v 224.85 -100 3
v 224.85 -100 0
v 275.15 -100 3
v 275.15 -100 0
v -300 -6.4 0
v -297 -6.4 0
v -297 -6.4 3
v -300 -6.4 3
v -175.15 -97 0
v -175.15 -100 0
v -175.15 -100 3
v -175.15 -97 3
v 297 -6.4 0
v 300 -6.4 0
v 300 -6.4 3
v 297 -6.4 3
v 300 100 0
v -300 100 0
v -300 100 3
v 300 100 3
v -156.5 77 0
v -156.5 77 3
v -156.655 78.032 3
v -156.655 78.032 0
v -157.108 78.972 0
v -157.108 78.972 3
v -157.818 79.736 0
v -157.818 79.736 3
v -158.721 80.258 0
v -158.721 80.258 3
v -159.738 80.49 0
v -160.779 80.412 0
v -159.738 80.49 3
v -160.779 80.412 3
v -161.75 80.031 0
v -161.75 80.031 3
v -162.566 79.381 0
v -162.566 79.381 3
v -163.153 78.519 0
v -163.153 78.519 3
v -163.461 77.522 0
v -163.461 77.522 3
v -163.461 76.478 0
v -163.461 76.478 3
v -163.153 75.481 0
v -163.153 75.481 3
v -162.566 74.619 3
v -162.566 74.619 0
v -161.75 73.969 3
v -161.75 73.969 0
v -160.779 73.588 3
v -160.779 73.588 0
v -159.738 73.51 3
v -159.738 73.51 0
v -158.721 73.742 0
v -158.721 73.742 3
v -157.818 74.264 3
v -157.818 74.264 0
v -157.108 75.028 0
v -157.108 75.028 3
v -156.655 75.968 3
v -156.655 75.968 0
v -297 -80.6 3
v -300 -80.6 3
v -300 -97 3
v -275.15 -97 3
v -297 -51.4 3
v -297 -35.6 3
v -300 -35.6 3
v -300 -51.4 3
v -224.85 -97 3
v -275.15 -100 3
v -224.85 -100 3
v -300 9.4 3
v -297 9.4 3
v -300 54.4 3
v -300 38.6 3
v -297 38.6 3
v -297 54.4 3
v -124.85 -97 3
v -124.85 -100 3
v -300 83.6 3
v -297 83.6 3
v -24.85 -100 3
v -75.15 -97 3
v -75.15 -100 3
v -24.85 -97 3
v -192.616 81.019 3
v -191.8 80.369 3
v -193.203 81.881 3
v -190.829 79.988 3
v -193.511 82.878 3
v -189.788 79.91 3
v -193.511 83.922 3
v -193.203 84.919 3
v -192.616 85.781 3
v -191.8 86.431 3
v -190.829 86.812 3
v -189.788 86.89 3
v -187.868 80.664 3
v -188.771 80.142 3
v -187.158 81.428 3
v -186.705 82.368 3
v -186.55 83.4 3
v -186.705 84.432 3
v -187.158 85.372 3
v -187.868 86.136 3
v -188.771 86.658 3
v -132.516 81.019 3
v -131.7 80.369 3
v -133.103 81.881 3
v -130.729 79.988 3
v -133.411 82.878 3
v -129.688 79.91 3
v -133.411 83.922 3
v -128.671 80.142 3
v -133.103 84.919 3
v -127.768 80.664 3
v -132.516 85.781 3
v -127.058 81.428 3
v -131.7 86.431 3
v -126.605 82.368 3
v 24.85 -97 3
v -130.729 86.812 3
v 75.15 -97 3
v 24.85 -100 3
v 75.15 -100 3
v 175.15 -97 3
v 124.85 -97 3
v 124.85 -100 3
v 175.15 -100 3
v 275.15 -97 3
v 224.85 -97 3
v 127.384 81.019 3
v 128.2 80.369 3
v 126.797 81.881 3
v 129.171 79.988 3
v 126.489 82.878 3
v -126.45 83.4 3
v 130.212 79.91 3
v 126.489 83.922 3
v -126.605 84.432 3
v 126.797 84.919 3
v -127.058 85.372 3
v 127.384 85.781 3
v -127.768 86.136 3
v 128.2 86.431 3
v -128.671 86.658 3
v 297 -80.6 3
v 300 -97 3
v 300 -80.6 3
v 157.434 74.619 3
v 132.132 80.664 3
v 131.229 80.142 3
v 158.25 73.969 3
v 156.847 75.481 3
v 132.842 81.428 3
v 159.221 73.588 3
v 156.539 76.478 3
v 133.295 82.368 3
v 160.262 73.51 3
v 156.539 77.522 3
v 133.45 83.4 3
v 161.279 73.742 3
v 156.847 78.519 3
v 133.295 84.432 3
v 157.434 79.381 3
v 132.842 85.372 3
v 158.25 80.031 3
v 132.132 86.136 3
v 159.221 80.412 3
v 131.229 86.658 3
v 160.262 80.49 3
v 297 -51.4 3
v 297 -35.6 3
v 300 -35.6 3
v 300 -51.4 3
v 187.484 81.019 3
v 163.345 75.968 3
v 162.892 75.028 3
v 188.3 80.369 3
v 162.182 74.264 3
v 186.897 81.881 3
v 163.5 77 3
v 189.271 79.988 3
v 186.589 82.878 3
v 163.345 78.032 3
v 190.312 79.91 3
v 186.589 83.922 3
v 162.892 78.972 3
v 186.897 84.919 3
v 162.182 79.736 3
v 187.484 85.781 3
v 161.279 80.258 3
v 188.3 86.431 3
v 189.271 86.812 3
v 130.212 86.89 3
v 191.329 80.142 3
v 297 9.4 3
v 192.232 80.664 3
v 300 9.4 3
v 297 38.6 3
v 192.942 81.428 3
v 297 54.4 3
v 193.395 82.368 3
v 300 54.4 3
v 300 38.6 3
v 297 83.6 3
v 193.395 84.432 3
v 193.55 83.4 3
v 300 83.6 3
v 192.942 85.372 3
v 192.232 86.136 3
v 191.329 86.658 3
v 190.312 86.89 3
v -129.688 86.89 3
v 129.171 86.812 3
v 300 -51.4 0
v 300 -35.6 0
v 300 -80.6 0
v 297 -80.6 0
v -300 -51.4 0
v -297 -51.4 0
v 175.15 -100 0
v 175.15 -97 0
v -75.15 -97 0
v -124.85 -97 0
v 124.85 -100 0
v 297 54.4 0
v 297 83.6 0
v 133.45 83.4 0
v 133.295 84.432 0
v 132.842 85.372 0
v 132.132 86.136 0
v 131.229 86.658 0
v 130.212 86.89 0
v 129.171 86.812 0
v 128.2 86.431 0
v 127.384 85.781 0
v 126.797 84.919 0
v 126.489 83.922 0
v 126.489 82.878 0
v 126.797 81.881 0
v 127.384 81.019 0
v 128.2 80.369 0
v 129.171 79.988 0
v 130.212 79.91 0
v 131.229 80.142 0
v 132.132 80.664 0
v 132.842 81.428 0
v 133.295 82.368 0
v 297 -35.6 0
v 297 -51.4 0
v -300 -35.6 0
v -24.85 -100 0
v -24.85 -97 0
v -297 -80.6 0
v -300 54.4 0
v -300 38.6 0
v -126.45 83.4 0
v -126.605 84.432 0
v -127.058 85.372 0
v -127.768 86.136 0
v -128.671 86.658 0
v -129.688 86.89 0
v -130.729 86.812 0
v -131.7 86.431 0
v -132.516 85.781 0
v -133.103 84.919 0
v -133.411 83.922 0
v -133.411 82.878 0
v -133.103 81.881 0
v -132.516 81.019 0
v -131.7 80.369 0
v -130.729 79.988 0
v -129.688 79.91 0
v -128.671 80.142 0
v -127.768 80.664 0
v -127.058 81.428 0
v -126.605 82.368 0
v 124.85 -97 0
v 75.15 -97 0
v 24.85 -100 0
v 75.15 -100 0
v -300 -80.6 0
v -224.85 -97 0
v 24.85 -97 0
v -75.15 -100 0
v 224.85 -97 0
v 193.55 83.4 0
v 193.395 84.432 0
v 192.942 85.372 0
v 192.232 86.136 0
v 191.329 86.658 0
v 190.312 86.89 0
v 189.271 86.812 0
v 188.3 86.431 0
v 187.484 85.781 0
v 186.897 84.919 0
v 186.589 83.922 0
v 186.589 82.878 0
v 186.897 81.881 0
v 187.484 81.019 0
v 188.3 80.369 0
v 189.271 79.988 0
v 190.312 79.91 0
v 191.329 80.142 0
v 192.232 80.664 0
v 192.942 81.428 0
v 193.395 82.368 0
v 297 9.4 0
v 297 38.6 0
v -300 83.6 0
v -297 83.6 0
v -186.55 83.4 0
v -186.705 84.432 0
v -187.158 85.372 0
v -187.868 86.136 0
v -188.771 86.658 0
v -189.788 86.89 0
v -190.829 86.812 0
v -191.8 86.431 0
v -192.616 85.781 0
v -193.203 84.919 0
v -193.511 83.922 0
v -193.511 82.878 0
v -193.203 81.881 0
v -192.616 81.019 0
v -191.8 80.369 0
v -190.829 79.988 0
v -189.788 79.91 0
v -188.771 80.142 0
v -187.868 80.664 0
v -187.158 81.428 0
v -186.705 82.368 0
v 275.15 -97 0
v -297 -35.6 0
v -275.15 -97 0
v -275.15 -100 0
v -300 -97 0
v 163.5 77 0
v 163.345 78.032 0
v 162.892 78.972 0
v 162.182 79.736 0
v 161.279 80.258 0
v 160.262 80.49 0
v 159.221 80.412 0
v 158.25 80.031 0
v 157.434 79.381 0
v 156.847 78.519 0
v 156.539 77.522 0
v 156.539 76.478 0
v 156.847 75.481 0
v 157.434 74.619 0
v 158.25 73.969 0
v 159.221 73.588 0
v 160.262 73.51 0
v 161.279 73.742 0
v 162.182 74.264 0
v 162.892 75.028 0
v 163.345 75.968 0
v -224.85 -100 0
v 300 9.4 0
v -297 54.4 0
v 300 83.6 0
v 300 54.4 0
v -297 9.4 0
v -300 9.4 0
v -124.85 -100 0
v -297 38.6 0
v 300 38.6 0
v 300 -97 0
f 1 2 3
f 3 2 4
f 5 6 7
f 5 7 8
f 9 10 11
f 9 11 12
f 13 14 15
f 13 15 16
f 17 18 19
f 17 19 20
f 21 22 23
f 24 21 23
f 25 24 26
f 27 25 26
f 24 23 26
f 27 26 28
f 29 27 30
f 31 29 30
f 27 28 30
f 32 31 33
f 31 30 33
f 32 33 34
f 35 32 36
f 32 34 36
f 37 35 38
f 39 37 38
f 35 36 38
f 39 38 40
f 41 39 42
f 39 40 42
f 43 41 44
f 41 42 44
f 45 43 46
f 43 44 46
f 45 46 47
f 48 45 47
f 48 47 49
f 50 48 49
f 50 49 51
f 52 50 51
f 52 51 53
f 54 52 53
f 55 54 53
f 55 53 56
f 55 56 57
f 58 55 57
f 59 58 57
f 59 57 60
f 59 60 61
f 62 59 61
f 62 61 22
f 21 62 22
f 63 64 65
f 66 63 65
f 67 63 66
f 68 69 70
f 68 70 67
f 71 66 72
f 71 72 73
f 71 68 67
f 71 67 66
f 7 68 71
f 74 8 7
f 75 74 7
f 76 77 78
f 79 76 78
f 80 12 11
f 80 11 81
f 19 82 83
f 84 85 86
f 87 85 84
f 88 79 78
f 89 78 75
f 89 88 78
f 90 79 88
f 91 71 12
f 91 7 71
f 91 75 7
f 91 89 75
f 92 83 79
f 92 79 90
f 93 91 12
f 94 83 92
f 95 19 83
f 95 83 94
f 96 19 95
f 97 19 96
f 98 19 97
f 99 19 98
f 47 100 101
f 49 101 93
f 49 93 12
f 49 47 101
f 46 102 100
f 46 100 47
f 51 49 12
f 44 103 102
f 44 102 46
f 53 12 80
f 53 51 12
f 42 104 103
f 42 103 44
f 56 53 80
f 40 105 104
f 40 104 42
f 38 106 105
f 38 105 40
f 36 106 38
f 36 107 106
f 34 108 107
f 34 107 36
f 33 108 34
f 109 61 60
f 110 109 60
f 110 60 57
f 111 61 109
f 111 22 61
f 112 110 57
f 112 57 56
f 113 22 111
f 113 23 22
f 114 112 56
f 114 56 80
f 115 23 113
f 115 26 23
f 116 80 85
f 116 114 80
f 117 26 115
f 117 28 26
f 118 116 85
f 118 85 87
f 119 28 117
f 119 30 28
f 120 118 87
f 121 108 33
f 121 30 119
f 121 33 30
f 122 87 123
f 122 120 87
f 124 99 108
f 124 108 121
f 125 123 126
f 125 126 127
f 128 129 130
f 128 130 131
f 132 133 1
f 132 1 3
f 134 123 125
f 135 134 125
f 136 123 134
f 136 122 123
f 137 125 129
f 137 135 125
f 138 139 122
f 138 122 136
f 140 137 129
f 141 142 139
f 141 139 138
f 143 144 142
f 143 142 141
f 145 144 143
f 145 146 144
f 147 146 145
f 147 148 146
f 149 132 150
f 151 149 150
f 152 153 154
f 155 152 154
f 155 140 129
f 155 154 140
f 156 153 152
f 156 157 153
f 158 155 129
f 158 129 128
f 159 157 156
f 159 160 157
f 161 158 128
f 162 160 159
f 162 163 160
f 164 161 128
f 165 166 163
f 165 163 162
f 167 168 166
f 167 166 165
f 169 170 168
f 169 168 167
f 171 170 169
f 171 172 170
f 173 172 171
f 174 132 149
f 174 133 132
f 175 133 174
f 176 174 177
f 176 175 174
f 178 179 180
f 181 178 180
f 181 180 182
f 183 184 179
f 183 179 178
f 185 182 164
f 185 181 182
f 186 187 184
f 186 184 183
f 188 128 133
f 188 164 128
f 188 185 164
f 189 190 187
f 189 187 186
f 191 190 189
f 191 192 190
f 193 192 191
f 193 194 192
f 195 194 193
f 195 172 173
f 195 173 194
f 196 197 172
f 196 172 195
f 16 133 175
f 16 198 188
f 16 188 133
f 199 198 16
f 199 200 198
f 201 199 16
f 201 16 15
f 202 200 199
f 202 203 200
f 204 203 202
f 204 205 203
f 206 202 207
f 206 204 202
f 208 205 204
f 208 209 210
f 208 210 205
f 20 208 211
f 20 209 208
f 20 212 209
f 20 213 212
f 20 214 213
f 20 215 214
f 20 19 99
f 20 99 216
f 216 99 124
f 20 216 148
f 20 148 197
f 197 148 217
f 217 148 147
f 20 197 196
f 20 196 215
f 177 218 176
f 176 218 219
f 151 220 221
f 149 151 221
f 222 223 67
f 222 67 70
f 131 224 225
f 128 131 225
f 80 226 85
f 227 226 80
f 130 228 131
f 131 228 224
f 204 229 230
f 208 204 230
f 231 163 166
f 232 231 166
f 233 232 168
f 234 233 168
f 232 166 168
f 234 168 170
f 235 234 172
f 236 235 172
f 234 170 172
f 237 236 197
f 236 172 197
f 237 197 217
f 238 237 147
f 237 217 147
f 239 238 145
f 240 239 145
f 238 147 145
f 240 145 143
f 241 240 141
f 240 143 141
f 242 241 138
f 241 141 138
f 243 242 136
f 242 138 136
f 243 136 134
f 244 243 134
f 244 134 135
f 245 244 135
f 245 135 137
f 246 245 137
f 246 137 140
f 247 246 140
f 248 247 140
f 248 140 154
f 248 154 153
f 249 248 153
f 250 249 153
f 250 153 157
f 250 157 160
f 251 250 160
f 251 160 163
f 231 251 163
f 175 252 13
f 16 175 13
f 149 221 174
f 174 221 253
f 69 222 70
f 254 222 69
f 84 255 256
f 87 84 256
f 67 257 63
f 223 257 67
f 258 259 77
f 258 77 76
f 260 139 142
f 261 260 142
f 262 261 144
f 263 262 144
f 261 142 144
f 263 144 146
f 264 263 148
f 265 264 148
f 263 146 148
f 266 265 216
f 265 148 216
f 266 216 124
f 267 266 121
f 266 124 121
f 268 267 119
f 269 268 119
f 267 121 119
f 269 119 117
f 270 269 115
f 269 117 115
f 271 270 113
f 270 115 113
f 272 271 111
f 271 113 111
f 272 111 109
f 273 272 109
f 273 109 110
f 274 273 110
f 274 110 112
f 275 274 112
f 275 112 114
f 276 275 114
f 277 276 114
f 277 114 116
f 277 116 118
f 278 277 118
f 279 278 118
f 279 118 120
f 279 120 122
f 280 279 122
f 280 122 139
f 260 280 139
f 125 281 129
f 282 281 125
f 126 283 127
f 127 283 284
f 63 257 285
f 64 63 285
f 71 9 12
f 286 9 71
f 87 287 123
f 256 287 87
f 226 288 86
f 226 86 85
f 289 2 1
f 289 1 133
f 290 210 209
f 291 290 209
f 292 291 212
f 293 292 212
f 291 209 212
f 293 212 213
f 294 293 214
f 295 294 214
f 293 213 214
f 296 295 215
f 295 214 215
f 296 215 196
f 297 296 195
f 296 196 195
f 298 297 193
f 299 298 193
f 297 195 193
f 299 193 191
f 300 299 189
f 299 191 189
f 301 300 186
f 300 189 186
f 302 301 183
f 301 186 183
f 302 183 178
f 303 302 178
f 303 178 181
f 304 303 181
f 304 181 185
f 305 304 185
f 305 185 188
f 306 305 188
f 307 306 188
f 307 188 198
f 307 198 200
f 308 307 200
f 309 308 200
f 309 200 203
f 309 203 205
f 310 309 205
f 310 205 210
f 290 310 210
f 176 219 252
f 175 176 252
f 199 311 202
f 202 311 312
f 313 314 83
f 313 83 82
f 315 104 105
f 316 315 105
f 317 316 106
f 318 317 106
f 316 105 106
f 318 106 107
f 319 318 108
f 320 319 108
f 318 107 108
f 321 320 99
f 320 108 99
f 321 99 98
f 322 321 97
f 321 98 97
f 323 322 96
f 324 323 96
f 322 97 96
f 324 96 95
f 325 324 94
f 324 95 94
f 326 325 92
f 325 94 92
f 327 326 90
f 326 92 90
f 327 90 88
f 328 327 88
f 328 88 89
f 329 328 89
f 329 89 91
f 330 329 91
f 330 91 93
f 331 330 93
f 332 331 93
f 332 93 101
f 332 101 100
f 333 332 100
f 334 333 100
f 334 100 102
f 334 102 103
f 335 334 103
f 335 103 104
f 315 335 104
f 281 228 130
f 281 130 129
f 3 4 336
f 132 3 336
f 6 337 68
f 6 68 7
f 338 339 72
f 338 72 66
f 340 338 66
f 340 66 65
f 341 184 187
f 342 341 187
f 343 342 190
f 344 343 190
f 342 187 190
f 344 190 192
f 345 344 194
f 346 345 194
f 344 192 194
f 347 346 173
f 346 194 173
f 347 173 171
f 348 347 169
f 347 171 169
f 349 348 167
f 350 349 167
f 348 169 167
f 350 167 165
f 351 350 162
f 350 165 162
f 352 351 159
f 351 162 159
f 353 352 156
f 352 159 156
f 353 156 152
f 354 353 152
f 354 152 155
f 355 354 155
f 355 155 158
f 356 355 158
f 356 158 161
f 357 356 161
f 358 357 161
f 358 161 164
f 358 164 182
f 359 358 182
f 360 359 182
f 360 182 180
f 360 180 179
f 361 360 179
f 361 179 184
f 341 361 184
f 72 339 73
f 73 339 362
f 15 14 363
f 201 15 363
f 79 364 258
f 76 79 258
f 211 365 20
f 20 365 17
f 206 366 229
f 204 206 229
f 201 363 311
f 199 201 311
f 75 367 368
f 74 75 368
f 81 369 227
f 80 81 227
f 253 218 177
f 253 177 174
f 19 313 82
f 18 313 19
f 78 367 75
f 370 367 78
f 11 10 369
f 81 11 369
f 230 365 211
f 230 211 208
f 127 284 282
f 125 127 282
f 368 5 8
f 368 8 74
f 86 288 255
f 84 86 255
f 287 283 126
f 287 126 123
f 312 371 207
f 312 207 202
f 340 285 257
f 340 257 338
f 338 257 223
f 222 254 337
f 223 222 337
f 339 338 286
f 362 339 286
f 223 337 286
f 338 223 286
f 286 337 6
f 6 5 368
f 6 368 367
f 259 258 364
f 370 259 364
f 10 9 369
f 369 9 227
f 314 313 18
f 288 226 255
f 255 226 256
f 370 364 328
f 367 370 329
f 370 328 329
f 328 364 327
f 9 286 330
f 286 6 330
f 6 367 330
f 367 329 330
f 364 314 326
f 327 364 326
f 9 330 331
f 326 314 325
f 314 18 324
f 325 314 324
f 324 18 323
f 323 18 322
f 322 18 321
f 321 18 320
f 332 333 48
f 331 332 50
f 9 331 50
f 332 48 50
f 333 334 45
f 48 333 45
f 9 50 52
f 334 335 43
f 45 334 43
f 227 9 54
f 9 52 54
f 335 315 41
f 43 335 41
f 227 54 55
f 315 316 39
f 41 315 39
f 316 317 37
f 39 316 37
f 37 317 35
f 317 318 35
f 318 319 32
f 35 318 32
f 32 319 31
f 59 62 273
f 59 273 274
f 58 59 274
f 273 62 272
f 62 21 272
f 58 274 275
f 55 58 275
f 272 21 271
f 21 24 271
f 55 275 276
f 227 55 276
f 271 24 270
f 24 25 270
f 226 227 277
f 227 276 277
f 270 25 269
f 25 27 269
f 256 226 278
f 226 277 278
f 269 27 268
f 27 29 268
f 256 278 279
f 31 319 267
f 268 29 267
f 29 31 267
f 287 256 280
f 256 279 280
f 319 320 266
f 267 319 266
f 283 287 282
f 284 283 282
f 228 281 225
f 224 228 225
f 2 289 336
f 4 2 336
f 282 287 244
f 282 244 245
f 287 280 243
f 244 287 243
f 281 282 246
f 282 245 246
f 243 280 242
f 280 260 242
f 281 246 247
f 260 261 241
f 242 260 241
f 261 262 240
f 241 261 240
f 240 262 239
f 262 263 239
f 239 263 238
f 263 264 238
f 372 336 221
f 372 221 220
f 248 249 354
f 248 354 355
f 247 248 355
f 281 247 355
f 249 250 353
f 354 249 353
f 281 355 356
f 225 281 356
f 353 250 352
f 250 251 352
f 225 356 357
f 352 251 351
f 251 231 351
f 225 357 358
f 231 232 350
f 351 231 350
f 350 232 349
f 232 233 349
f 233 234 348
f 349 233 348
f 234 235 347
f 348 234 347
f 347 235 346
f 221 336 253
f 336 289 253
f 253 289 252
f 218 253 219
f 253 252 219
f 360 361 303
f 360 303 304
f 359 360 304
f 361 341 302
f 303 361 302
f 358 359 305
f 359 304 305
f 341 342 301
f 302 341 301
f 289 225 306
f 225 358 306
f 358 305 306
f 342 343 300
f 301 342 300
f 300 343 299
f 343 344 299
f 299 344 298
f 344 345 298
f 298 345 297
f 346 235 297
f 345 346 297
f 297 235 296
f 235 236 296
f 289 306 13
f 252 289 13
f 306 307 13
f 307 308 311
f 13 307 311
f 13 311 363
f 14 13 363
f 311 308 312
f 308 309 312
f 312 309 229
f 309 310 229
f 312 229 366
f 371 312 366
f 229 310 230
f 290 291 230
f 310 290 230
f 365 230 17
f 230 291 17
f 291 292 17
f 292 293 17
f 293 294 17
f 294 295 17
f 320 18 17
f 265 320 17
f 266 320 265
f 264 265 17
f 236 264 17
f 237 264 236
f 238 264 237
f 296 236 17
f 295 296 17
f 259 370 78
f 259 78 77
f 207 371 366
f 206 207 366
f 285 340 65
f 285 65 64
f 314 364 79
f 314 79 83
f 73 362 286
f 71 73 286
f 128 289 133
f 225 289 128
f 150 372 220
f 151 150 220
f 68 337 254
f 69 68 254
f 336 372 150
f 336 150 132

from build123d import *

# Parameters (mm, degrees)
CROQUIS1_W              = 600
CROQUIS1_H              = 200
SALIENTE_EXTRUIR1_DEPTH = 3
CROQUIS2_W              = 3
CROQUIS2_H              = 29.2
CROQUIS2_W_2            = 24.85
CROQUIS2_H_2            = 3
CROQUIS2_W_3            = 49.7
CORTAR_EXTRUIR1_DEPTH   = 4
CORTAR_EXTRUIR2_DEPTH   = 4


with BuildPart() as part:
    # Croquis1 → Saliente-Extruir1 (new body)
    with BuildSketch(Plane.XY):
        Rectangle(CROQUIS1_W, CROQUIS1_H)
    extrude(amount=SALIENTE_EXTRUIR1_DEPTH)

    # Croquis2 → Cortar-Extruir1 (cut, through all)
    with BuildSketch(Plane(origin=(0, 0, 0), x_dir=(-1, 0, 0), z_dir=(0, 0, -1))):
        with Locations((-298.5, 69)):
            Rectangle(CROQUIS2_W, CROQUIS2_H)
        with Locations((298.5, 69)):
            Rectangle(CROQUIS2_W, CROQUIS2_H)
        with Locations((-298.5, 24)):
            Rectangle(CROQUIS2_W, CROQUIS2_H)
        with Locations((298.5, 24)):
            Rectangle(CROQUIS2_W, CROQUIS2_H)
        with Locations((-298.5, -21)):
            Rectangle(CROQUIS2_W, CROQUIS2_H)
        with Locations((298.5, -21)):
            Rectangle(CROQUIS2_W, CROQUIS2_H)
        with Locations((-298.5, -66)):
            Rectangle(CROQUIS2_W, CROQUIS2_H)
        with Locations((298.5, -66)):
            Rectangle(CROQUIS2_W, CROQUIS2_H)
        with Locations((-287.575, -98.5)):
            Rectangle(CROQUIS2_W_2, CROQUIS2_H_2)
        with Locations((287.575, -98.5)):
            Rectangle(CROQUIS2_W_2, CROQUIS2_H_2)
        with Locations((-200, -98.5)):
            Rectangle(CROQUIS2_W_3, CROQUIS2_H_2)
        with Locations((200, -98.5)):
            Rectangle(CROQUIS2_W_3, CROQUIS2_H_2)
        with Locations((-100, -98.5)):
            Rectangle(CROQUIS2_W_3, CROQUIS2_H_2)
        with Locations((100, -98.5)):
            Rectangle(CROQUIS2_W_3, CROQUIS2_H_2)
        with Locations((0, -98.5)):
            Rectangle(CROQUIS2_W_3, CROQUIS2_H_2)
    extrude(amount=-CORTAR_EXTRUIR1_DEPTH, mode=Mode.SUBTRACT)

    # Croquis3 → Cortar-Extruir2 (cut, through all)
    with BuildSketch(Plane.XY.offset(3)):
        with BuildLine():
            ThreePointArc((-163.5, 77), (-160, 73.5), (-156.5, 77))
            ThreePointArc((-156.5, 77), (-160, 80.5), (-163.5, 77))
        make_face()
        with BuildLine():
            ThreePointArc((-133.45, 83.4), (-129.95, 79.9), (-126.45, 83.4))
            ThreePointArc((-126.45, 83.4), (-129.95, 86.9), (-133.45, 83.4))
        make_face()
        with BuildLine():
            ThreePointArc((126.45, 83.4), (129.95, 79.9), (133.45, 83.4))
            ThreePointArc((133.45, 83.4), (129.95, 86.9), (126.45, 83.4))
        make_face()
        with BuildLine():
            ThreePointArc((156.5, 77), (160, 73.5), (163.5, 77))
            ThreePointArc((163.5, 77), (160, 80.5), (156.5, 77))
        make_face()
        with BuildLine():
            ThreePointArc((186.55, 83.4), (190.05, 79.9), (193.55, 83.4))
            ThreePointArc((193.55, 83.4), (190.05, 86.9), (186.55, 83.4))
        make_face()
        with BuildLine():
            ThreePointArc((-193.55, 83.4), (-190.05, 79.9), (-186.55, 83.4))
            ThreePointArc((-186.55, 83.4), (-190.05, 86.9), (-193.55, 83.4))
        make_face()
    extrude(amount=-CORTAR_EXTRUIR2_DEPTH, mode=Mode.SUBTRACT)


solid = part.part
